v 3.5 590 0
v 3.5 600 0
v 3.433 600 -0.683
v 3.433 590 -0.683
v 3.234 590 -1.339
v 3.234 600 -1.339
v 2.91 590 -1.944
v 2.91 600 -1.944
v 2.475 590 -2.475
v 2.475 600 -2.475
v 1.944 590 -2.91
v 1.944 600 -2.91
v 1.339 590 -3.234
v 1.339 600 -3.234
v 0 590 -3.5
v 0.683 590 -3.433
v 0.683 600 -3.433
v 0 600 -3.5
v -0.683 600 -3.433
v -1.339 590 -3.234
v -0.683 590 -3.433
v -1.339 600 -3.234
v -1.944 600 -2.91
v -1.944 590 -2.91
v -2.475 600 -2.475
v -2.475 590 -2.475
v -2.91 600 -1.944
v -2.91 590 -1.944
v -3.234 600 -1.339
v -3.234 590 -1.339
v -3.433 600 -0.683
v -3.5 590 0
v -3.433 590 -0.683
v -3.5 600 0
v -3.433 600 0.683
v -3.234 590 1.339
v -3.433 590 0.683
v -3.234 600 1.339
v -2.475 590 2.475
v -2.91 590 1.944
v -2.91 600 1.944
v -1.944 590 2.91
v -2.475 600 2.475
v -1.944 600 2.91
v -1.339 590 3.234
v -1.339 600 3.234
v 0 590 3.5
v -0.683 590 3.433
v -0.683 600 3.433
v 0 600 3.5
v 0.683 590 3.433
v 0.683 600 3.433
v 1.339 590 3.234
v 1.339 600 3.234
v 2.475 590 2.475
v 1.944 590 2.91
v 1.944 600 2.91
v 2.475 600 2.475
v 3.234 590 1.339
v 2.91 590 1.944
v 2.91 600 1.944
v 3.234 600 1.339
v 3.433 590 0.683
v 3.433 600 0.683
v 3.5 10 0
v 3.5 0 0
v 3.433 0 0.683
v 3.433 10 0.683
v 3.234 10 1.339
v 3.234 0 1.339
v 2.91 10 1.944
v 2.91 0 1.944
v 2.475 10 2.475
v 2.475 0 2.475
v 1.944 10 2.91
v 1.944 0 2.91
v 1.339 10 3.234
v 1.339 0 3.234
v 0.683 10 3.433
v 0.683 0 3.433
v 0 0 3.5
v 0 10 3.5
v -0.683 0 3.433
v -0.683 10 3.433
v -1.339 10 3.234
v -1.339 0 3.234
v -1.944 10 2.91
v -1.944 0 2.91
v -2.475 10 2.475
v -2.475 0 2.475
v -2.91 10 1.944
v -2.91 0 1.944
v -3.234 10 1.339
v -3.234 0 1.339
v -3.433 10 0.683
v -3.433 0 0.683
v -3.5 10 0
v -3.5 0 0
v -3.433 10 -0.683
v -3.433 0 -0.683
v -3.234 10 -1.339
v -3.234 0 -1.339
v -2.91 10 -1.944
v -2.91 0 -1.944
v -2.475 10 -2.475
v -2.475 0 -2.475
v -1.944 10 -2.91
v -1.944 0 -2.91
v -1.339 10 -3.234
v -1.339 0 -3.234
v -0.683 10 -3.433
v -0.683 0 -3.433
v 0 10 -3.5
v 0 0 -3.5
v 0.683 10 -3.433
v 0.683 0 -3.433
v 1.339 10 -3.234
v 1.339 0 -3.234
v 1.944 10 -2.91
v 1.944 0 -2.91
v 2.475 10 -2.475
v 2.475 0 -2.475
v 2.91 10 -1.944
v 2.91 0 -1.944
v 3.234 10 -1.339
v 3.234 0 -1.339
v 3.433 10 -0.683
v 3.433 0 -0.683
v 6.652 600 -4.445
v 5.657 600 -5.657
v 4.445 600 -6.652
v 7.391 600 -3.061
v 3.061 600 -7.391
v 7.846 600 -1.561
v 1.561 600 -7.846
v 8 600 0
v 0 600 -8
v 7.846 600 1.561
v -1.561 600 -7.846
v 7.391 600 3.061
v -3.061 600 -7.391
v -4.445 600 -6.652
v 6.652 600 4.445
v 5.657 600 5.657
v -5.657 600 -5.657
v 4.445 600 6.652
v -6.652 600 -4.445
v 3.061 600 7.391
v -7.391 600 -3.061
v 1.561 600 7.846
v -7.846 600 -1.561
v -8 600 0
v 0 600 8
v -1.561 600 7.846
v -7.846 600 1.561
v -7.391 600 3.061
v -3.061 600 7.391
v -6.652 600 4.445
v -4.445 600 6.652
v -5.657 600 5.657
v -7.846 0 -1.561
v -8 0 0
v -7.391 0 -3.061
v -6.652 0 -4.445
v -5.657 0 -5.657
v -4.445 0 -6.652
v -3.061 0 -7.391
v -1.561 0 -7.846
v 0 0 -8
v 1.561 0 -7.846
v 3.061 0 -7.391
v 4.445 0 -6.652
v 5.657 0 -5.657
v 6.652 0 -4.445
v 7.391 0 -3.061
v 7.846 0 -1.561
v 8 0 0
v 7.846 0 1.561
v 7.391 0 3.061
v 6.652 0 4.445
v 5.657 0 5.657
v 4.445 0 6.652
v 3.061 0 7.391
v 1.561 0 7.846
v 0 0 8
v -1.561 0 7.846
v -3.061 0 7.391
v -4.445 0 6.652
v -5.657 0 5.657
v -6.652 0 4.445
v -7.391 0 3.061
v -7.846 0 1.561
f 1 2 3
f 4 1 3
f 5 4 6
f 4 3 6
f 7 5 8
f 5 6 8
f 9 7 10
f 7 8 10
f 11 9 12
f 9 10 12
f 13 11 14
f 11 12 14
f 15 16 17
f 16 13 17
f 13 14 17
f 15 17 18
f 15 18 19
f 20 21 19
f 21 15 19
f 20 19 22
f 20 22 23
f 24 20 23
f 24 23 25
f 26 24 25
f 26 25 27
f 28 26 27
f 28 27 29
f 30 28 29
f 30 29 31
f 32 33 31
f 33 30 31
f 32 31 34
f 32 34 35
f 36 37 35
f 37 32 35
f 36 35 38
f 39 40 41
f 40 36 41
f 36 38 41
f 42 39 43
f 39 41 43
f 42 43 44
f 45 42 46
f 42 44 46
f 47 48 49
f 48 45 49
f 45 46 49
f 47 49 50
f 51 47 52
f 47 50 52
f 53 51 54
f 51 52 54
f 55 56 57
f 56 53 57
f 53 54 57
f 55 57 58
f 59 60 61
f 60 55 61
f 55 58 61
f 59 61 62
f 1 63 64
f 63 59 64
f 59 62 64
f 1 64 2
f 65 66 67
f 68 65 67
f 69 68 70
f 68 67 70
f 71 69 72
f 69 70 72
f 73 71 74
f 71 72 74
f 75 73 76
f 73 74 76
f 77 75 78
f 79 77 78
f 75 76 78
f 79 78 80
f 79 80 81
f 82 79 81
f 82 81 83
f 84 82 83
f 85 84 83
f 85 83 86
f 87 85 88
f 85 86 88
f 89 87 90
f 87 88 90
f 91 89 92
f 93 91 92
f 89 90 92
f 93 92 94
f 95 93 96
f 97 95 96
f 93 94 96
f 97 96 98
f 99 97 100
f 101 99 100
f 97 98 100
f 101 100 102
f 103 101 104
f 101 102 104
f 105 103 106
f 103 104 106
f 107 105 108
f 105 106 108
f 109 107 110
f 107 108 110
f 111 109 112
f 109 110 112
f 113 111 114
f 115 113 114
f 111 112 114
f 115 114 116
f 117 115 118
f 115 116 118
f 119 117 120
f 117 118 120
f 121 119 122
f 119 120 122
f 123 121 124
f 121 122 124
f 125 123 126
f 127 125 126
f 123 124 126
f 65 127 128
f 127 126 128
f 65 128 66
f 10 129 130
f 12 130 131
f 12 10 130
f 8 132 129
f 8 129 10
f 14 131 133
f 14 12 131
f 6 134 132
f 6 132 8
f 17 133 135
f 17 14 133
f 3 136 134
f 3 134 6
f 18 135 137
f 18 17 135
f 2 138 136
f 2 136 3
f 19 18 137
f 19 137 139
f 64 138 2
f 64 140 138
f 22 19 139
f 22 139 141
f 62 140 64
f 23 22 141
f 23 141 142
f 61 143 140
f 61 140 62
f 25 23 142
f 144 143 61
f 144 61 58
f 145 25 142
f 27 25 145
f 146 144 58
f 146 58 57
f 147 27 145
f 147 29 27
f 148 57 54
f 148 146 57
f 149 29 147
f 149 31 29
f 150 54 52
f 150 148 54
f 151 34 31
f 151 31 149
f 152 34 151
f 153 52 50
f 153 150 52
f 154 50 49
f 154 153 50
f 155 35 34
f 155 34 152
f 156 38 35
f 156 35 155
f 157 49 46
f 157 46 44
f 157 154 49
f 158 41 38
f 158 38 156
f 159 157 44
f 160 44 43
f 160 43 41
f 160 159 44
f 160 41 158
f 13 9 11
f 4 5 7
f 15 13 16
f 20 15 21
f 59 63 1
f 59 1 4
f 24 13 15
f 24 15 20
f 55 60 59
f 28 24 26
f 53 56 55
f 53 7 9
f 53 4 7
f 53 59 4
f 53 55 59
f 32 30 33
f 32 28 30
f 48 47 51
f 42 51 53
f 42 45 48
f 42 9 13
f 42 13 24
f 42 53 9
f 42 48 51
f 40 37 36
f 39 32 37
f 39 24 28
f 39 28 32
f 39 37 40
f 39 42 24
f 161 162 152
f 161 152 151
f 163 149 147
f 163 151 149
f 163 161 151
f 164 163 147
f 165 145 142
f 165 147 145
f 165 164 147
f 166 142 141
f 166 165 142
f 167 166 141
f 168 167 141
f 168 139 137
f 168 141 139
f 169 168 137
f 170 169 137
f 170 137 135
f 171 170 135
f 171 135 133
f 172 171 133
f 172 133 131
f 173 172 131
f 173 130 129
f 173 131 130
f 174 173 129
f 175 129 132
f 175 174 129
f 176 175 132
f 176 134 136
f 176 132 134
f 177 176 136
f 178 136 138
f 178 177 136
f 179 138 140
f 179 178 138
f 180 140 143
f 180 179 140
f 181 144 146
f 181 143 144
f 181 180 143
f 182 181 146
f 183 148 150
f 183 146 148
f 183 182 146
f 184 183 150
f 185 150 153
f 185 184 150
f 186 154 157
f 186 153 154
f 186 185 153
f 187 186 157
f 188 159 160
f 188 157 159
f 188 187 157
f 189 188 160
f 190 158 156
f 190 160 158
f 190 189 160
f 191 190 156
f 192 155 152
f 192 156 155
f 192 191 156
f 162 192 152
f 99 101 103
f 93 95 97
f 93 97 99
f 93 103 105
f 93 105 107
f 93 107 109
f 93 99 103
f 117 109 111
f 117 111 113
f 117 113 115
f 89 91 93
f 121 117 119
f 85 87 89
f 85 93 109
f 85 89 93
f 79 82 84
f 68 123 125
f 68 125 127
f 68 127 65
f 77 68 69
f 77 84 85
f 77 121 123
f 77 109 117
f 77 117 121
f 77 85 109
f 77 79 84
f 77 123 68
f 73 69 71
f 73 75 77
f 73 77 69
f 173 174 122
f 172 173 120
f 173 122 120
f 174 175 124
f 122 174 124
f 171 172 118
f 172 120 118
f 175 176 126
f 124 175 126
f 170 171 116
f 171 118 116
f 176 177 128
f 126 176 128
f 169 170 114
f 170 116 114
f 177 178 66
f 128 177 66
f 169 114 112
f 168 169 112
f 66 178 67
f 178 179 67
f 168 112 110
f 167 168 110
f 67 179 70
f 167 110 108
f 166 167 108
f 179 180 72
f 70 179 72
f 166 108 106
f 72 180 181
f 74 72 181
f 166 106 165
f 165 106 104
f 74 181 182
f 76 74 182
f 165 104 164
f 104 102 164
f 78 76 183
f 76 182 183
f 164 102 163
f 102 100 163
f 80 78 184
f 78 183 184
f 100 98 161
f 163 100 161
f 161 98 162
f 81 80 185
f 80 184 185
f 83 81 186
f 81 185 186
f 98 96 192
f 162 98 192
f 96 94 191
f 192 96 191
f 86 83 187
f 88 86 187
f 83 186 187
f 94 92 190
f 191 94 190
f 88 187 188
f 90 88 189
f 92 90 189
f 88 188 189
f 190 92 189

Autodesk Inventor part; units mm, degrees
ref_plane "YZ Plane" through (0, 0, 0) normal (1, 0, 0) x (0, 1, 0)
ref_plane "XZ Plane" through (0, 0, 0) normal (0, 1, 0) x (-1, 0, 0)
sketch "Sketch1" plane through (0, 0, 0) normal (0, 1, 0) x (-1, 0, 0)
  circle A0 centre (0, 0) radius 8
  dimension "d0" = 16
extrude "Extrusion1" add sketch "Sketch1" along normal blind 600
sketch "Sketch2" plane through (0, 0, 0) normal (0, -1, 0) x (1, 0, 0)
  circle A0 centre (0, 0) radius 3.5
  dimension "d7" = 7
extrude "Extrusion2" cut sketch "Sketch2" against normal blind 10
ref_plane "Work Plane1" through (0, 300, 0) normal (0, -1, 0) x (1, 0, 0)
mirror "Mirror1" about plane through (0, 300, 0) normal (0, -1, 0) of "Extrusion2"
properties part number "ScrewDriver" material "Aluminum 6061"
